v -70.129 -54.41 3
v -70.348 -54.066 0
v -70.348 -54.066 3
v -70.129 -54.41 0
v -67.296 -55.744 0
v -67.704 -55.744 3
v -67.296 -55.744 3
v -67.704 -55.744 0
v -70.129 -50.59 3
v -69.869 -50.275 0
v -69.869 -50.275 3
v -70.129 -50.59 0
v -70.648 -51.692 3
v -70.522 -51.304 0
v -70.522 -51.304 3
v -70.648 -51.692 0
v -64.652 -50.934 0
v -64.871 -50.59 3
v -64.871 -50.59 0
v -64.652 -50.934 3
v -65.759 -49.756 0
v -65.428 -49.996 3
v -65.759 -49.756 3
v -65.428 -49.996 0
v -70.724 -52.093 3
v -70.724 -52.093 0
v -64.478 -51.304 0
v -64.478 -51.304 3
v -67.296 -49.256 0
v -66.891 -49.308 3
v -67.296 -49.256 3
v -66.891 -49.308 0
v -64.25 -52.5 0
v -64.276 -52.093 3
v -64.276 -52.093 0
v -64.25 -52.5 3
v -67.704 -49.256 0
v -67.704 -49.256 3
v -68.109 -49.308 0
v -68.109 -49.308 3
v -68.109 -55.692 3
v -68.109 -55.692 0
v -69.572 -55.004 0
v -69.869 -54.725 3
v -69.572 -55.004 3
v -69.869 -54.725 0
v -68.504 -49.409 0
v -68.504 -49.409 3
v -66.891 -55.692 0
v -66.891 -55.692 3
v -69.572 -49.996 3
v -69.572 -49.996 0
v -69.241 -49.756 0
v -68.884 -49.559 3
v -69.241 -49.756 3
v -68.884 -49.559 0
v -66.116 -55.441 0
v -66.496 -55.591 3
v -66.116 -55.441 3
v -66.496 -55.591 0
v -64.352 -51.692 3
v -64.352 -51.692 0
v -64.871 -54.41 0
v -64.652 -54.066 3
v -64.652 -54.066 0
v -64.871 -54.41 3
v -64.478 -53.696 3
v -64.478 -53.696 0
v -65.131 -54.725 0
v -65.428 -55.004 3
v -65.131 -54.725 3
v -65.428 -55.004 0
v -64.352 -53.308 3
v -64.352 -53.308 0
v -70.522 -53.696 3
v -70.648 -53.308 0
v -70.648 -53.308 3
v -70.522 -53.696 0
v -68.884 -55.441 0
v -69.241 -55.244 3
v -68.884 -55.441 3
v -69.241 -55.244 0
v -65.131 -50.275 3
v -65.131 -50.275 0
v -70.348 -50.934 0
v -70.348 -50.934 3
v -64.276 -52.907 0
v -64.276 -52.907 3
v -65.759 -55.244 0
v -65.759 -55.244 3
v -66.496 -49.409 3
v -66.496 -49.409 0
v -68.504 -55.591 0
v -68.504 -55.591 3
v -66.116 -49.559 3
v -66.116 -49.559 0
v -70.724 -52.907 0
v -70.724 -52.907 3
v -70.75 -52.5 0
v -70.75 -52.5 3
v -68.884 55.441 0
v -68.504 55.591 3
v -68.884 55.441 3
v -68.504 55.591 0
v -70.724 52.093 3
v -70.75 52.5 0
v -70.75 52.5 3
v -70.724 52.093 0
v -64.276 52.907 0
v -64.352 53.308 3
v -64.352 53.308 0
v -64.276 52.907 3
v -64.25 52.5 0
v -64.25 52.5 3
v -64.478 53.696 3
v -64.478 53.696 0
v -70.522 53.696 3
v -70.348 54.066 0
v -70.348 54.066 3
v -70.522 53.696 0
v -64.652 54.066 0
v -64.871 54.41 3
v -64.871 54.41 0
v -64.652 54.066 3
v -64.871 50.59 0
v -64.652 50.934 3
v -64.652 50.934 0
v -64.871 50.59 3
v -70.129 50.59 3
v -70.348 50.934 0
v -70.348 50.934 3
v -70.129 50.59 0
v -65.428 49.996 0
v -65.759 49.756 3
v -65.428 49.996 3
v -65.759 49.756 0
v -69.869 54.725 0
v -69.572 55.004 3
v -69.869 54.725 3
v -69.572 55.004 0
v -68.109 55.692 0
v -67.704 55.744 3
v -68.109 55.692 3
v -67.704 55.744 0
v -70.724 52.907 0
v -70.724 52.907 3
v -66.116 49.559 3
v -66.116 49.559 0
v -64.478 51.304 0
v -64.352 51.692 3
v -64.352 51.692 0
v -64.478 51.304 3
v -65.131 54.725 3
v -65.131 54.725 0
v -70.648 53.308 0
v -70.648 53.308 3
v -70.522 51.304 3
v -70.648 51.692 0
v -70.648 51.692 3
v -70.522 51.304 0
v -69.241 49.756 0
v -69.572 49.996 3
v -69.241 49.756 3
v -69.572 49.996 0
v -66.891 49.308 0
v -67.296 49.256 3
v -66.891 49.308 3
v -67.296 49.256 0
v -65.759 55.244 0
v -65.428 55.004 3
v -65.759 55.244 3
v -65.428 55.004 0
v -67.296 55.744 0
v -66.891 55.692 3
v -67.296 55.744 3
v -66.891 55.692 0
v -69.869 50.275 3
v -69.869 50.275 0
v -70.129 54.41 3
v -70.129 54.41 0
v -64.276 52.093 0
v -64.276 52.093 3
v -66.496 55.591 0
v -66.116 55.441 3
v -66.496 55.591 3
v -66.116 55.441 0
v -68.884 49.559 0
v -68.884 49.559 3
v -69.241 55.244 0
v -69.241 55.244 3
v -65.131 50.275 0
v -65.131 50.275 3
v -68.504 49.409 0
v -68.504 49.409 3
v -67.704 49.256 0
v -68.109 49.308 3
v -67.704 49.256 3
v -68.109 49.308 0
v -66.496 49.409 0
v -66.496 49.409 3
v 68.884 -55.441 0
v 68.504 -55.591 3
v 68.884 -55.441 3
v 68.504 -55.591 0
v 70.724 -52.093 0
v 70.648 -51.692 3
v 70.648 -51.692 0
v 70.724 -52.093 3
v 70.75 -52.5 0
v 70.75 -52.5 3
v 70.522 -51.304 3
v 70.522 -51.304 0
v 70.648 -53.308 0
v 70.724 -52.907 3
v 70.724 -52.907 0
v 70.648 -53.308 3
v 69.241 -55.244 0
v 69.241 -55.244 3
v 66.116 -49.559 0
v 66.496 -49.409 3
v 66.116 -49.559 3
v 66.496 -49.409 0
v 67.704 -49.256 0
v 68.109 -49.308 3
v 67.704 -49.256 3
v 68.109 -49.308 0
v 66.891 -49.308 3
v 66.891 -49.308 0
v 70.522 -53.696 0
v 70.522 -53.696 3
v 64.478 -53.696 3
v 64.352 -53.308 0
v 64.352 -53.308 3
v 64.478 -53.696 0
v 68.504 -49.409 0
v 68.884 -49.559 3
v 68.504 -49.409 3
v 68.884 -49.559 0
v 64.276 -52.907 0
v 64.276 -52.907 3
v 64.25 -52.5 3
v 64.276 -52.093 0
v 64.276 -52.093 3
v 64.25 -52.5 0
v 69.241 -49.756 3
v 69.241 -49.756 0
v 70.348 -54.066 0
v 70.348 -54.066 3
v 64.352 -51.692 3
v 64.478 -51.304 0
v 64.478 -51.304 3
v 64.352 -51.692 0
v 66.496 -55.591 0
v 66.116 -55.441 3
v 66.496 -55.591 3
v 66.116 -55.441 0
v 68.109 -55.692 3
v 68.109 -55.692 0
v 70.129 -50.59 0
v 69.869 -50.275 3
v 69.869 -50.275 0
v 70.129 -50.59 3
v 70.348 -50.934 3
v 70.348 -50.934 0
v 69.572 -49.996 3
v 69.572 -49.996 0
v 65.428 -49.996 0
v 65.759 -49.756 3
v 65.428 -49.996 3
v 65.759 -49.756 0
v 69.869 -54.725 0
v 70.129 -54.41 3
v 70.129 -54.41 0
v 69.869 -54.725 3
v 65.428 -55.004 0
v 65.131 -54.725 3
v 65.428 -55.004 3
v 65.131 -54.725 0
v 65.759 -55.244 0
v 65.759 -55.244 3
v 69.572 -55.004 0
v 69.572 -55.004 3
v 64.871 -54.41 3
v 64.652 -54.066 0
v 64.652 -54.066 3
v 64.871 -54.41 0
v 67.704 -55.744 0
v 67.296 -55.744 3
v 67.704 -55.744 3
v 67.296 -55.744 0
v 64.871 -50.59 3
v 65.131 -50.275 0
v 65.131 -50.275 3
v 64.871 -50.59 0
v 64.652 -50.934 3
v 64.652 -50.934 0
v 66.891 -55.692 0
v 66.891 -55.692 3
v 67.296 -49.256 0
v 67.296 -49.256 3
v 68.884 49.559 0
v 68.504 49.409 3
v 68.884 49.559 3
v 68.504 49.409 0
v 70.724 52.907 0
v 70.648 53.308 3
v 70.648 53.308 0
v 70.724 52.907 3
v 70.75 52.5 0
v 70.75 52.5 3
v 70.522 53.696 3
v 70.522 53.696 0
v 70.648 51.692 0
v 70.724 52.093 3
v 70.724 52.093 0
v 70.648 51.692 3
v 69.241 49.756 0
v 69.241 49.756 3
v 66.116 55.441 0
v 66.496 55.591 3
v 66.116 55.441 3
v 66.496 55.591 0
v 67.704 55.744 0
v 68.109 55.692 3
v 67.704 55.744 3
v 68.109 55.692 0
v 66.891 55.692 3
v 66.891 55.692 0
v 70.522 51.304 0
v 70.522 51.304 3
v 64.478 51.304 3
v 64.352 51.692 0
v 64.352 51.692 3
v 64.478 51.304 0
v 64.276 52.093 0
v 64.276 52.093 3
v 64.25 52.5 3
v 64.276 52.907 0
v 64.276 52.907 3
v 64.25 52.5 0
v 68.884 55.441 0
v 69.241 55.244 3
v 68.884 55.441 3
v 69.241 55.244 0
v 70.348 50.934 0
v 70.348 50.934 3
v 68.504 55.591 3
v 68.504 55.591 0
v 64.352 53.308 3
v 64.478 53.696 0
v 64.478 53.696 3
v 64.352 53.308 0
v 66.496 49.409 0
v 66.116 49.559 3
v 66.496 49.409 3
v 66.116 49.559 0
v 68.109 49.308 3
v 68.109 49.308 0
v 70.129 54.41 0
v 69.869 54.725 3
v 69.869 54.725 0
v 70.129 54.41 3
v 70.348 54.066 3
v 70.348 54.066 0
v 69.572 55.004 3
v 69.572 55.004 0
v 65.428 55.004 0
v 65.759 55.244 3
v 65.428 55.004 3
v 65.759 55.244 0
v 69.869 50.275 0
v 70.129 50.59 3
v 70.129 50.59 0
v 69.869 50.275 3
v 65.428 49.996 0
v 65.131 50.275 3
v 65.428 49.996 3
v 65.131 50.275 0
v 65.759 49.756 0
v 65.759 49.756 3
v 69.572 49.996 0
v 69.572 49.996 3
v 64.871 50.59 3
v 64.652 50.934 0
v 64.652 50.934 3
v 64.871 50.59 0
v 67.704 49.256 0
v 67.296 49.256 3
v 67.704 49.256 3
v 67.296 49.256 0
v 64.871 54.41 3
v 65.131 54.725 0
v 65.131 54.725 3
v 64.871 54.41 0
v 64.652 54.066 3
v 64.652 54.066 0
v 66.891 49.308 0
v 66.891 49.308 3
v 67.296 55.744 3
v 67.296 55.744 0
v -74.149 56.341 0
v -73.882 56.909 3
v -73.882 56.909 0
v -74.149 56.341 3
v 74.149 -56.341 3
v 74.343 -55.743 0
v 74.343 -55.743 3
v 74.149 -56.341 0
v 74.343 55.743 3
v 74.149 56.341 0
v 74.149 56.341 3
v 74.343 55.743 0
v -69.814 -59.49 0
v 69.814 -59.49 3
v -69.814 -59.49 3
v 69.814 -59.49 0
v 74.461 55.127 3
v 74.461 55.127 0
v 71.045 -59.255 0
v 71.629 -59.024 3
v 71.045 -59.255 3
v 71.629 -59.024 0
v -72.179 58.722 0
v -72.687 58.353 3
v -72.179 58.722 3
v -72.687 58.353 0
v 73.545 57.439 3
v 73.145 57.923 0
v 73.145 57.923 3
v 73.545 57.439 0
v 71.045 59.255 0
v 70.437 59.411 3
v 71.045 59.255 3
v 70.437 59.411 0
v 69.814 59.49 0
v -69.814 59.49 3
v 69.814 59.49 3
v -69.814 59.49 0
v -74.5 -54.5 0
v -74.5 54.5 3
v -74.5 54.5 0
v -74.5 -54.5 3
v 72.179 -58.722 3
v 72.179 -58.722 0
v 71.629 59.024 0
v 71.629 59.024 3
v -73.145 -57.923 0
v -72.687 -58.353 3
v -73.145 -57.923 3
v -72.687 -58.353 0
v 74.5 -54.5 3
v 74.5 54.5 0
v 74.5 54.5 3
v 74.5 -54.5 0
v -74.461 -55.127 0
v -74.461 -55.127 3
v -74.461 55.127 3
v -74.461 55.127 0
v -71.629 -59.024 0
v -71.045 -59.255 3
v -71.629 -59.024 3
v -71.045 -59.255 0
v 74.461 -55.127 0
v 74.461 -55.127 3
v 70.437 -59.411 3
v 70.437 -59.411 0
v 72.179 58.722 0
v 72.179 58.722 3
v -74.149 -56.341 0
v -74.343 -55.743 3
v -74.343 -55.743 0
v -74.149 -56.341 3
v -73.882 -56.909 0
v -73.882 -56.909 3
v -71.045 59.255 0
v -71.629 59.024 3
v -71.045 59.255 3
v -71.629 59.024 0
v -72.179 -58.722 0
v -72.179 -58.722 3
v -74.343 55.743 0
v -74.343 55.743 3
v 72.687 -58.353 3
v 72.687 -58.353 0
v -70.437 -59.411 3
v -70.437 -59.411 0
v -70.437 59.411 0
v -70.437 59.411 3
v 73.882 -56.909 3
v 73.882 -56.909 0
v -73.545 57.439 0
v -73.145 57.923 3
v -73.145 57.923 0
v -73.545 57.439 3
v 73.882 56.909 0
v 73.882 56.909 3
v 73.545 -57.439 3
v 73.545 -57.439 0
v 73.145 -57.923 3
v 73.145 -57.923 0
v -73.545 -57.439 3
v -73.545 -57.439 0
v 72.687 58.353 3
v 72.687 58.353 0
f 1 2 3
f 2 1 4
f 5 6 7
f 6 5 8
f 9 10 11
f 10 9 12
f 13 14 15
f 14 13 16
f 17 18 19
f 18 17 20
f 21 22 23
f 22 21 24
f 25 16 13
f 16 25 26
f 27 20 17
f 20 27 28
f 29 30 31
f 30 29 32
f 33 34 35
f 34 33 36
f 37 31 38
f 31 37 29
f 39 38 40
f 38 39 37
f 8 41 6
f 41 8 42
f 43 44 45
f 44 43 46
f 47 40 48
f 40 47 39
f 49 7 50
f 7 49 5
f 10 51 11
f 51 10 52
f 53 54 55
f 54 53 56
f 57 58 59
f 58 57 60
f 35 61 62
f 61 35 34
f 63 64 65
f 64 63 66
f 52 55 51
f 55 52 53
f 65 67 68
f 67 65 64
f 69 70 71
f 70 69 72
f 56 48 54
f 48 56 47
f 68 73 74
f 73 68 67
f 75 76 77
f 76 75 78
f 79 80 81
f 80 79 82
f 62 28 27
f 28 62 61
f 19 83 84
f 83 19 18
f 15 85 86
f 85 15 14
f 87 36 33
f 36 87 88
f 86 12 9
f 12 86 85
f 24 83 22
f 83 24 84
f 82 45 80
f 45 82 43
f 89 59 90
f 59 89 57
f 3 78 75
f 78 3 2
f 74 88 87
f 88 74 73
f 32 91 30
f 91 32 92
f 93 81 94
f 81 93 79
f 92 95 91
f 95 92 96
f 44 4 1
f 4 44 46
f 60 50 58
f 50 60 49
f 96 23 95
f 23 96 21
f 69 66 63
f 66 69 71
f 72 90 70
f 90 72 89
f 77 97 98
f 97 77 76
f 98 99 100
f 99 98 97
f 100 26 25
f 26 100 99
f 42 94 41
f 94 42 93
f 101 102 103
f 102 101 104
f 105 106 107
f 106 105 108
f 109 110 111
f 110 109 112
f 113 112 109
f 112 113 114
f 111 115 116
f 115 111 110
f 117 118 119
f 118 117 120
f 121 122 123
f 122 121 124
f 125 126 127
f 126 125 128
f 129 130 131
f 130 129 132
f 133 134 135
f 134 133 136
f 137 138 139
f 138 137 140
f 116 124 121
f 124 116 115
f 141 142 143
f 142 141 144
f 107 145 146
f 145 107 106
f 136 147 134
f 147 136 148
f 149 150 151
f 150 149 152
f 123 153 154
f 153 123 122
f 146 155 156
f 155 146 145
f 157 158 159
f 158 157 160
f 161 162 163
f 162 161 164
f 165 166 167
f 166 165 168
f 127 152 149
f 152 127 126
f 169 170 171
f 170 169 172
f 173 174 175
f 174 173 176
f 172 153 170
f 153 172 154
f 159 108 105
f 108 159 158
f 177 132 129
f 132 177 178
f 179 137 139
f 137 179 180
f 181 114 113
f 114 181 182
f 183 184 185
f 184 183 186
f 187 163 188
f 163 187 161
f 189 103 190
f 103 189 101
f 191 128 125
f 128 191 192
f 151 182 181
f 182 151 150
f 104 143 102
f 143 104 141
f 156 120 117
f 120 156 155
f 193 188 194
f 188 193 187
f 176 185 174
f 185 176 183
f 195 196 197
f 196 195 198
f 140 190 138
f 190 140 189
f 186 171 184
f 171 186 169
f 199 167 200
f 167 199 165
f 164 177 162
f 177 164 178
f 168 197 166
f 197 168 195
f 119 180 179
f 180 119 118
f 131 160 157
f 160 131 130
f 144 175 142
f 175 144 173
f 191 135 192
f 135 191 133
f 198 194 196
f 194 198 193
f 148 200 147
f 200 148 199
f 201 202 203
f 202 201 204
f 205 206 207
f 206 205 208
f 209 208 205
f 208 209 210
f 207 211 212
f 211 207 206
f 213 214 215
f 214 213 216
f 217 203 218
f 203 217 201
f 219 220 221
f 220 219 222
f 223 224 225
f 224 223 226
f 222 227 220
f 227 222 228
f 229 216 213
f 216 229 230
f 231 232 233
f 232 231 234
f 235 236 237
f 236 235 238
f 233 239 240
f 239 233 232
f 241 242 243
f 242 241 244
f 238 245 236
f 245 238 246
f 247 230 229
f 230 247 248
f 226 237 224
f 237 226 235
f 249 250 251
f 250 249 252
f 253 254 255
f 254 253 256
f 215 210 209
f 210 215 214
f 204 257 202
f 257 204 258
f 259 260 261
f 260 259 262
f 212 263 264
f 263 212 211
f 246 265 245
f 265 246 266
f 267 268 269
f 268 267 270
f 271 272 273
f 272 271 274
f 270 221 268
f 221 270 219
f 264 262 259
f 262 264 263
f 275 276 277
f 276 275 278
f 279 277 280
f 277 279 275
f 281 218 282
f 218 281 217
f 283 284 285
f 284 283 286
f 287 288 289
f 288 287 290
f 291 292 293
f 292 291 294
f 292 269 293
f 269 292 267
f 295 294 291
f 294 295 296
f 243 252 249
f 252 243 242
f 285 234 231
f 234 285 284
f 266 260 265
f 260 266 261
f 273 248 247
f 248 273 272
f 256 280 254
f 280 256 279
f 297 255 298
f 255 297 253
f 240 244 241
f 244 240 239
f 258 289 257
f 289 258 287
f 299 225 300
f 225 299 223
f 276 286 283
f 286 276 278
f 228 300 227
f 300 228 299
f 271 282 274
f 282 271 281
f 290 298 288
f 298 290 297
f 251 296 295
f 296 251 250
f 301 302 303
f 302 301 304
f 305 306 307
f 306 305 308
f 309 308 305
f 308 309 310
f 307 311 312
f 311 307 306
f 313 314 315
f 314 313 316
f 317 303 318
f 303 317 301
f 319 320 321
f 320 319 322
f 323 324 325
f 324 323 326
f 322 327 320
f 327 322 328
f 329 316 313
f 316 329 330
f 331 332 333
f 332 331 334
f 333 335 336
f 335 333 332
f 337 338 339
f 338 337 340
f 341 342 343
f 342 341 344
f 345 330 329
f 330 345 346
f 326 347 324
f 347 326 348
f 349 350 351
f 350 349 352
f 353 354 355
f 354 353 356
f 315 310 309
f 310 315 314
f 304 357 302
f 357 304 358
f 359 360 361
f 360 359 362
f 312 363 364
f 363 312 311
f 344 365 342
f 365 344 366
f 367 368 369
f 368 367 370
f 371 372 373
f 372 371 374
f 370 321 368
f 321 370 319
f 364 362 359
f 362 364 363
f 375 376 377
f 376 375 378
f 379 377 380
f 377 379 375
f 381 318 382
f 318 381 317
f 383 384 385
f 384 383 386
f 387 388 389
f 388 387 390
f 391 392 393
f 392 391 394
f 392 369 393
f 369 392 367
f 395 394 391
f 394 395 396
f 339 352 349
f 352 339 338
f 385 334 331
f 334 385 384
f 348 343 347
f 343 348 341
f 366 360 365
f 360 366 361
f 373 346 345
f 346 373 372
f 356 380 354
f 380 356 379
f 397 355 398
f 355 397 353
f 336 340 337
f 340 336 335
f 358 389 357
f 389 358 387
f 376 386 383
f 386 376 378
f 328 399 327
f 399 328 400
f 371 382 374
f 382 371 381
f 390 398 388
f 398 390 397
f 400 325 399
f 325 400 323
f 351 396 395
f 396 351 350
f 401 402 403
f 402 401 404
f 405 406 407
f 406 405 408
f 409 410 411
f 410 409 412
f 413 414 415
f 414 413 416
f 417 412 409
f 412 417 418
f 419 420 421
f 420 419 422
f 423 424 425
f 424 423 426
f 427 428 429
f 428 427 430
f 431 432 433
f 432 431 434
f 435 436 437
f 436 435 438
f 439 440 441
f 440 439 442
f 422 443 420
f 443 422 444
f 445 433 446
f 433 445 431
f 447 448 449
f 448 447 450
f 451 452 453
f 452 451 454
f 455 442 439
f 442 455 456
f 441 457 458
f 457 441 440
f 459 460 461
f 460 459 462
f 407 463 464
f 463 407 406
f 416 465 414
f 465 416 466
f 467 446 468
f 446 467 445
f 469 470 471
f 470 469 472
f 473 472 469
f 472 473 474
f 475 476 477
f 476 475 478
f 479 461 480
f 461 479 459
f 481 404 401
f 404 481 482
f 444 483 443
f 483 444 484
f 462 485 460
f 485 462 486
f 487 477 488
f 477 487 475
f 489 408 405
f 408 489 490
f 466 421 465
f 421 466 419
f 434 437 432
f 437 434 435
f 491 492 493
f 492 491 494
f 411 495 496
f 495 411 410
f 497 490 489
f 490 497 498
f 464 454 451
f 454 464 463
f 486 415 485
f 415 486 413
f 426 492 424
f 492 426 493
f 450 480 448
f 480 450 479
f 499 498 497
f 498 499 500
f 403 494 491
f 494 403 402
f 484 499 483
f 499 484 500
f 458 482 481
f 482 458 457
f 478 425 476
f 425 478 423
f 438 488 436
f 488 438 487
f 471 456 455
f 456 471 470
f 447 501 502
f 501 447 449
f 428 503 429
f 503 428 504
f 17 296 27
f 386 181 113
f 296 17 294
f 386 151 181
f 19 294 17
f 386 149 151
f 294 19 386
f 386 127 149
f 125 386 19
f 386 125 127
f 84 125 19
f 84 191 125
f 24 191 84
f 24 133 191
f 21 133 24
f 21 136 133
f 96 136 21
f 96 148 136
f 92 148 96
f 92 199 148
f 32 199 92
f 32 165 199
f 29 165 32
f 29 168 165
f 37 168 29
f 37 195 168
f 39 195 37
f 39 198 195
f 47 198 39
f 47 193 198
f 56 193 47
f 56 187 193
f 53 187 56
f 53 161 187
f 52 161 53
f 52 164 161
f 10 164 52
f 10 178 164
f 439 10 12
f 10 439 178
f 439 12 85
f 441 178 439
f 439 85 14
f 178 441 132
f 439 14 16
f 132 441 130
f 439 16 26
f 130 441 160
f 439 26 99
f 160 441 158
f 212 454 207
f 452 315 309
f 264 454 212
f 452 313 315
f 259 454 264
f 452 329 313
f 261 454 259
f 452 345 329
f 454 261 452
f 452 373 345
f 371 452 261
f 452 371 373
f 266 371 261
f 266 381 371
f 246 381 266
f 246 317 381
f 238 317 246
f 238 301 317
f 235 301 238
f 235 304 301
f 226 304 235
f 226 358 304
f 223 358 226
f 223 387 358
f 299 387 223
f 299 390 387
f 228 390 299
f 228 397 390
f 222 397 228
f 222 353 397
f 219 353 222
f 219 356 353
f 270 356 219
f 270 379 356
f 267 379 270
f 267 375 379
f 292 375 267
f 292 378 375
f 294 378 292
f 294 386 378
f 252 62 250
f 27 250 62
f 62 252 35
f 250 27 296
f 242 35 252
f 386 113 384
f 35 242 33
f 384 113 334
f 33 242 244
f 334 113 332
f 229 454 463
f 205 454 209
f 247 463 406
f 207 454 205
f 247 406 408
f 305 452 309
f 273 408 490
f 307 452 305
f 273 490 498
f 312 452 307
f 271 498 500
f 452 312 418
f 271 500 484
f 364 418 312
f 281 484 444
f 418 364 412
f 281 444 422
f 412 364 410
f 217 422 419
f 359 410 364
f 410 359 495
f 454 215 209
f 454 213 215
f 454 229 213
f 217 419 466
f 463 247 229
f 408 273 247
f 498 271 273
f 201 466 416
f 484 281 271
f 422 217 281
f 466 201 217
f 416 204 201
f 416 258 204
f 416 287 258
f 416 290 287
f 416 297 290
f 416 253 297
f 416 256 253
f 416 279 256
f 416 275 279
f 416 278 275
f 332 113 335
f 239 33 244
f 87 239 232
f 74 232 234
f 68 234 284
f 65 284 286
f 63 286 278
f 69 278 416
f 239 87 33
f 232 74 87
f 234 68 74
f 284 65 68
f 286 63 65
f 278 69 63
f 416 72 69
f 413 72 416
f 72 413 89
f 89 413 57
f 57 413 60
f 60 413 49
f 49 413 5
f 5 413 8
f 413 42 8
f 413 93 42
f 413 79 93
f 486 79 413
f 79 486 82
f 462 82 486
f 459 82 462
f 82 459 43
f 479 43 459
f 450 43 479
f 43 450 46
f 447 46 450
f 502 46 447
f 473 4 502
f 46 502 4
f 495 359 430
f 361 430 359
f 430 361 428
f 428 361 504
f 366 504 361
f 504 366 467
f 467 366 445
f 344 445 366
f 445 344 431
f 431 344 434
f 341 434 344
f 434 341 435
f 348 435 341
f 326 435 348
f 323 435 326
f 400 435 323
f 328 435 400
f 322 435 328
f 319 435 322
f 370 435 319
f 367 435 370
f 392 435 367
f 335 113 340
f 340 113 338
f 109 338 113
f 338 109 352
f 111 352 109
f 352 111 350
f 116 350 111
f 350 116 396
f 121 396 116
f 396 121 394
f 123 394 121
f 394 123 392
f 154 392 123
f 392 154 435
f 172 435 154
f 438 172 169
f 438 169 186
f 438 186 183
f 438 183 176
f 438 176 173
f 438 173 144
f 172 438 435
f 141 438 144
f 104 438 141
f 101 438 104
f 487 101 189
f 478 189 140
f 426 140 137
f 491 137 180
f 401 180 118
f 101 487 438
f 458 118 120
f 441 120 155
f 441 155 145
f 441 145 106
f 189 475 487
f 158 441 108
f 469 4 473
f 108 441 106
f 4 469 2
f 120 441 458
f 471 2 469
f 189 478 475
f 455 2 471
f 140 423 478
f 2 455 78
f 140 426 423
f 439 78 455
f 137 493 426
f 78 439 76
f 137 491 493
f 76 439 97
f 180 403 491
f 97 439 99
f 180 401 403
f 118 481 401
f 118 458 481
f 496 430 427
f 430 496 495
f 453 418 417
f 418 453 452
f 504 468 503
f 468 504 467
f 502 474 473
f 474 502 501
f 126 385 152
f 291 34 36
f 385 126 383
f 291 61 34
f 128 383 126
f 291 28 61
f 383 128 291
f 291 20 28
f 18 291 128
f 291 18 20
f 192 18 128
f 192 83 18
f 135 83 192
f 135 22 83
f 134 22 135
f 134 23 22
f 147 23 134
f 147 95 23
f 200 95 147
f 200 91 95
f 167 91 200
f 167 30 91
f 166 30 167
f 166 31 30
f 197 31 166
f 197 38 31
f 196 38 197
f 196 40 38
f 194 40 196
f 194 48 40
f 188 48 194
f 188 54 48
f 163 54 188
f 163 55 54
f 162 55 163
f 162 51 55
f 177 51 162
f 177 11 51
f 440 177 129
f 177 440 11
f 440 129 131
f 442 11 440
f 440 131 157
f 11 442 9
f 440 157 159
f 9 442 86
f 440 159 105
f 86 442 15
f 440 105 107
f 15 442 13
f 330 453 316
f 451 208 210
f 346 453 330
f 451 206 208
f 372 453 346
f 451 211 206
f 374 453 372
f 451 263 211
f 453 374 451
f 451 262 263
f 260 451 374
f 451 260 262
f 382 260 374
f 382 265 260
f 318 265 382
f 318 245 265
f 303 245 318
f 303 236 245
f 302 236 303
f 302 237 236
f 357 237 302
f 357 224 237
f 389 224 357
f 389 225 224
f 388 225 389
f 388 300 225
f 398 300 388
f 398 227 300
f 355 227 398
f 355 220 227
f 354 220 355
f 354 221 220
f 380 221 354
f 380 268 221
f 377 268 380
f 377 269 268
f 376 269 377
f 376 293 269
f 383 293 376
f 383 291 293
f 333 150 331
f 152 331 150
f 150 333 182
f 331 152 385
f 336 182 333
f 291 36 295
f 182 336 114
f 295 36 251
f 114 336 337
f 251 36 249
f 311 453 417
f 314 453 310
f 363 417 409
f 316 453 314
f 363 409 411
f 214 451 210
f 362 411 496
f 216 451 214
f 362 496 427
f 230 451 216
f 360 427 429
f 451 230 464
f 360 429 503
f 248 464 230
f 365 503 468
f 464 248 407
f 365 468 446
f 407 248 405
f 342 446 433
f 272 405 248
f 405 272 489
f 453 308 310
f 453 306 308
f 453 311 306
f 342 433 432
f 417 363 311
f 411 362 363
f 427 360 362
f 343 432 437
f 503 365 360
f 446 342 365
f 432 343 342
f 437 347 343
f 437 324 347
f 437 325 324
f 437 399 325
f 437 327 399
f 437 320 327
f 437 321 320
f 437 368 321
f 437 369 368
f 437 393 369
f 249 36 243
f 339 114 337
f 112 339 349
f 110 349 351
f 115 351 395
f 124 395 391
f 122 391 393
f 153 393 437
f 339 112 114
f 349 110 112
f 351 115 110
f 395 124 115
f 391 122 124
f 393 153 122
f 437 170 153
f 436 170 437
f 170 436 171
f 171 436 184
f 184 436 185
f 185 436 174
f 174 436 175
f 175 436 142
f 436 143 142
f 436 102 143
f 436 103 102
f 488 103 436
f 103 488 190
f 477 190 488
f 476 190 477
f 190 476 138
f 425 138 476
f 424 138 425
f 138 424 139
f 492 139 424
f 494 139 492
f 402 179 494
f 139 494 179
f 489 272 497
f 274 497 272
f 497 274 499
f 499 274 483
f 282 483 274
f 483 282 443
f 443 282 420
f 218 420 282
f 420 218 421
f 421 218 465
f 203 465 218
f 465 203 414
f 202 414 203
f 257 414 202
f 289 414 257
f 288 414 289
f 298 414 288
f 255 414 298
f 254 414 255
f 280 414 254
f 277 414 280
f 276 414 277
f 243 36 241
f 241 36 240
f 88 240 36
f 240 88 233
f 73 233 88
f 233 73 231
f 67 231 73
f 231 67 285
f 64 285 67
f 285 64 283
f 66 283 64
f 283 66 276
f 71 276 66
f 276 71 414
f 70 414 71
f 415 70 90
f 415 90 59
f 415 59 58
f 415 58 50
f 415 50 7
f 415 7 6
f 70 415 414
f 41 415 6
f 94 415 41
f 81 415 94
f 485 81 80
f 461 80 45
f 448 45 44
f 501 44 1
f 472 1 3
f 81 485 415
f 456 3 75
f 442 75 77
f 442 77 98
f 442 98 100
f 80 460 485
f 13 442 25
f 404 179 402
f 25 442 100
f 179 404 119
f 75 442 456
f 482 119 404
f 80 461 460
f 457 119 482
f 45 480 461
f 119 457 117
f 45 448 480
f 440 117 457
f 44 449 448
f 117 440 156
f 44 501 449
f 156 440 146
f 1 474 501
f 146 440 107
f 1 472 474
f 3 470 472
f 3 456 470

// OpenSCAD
$fn = 50;


difference() {
	union() {
		hull() {
			translate(v = [-69.5000000000, 54.5000000000, 0]) {
				cylinder(h = 3, r = 5);
			}
			translate(v = [69.5000000000, 54.5000000000, 0]) {
				cylinder(h = 3, r = 5);
			}
			translate(v = [-69.5000000000, -54.5000000000, 0]) {
				cylinder(h = 3, r = 5);
			}
			translate(v = [69.5000000000, -54.5000000000, 0]) {
				cylinder(h = 3, r = 5);
			}
		}
	}
	union() {
		translate(v = [-67.5000000000, -52.5000000000, -100.0000000000]) {
			cylinder(h = 200, r = 3.2500000000);
		}
		translate(v = [-67.5000000000, 52.5000000000, -100.0000000000]) {
			cylinder(h = 200, r = 3.2500000000);
		}
		translate(v = [67.5000000000, -52.5000000000, -100.0000000000]) {
			cylinder(h = 200, r = 3.2500000000);
		}
		translate(v = [67.5000000000, 52.5000000000, -100.0000000000]) {
			cylinder(h = 200, r = 3.2500000000);
		}
	}
}
